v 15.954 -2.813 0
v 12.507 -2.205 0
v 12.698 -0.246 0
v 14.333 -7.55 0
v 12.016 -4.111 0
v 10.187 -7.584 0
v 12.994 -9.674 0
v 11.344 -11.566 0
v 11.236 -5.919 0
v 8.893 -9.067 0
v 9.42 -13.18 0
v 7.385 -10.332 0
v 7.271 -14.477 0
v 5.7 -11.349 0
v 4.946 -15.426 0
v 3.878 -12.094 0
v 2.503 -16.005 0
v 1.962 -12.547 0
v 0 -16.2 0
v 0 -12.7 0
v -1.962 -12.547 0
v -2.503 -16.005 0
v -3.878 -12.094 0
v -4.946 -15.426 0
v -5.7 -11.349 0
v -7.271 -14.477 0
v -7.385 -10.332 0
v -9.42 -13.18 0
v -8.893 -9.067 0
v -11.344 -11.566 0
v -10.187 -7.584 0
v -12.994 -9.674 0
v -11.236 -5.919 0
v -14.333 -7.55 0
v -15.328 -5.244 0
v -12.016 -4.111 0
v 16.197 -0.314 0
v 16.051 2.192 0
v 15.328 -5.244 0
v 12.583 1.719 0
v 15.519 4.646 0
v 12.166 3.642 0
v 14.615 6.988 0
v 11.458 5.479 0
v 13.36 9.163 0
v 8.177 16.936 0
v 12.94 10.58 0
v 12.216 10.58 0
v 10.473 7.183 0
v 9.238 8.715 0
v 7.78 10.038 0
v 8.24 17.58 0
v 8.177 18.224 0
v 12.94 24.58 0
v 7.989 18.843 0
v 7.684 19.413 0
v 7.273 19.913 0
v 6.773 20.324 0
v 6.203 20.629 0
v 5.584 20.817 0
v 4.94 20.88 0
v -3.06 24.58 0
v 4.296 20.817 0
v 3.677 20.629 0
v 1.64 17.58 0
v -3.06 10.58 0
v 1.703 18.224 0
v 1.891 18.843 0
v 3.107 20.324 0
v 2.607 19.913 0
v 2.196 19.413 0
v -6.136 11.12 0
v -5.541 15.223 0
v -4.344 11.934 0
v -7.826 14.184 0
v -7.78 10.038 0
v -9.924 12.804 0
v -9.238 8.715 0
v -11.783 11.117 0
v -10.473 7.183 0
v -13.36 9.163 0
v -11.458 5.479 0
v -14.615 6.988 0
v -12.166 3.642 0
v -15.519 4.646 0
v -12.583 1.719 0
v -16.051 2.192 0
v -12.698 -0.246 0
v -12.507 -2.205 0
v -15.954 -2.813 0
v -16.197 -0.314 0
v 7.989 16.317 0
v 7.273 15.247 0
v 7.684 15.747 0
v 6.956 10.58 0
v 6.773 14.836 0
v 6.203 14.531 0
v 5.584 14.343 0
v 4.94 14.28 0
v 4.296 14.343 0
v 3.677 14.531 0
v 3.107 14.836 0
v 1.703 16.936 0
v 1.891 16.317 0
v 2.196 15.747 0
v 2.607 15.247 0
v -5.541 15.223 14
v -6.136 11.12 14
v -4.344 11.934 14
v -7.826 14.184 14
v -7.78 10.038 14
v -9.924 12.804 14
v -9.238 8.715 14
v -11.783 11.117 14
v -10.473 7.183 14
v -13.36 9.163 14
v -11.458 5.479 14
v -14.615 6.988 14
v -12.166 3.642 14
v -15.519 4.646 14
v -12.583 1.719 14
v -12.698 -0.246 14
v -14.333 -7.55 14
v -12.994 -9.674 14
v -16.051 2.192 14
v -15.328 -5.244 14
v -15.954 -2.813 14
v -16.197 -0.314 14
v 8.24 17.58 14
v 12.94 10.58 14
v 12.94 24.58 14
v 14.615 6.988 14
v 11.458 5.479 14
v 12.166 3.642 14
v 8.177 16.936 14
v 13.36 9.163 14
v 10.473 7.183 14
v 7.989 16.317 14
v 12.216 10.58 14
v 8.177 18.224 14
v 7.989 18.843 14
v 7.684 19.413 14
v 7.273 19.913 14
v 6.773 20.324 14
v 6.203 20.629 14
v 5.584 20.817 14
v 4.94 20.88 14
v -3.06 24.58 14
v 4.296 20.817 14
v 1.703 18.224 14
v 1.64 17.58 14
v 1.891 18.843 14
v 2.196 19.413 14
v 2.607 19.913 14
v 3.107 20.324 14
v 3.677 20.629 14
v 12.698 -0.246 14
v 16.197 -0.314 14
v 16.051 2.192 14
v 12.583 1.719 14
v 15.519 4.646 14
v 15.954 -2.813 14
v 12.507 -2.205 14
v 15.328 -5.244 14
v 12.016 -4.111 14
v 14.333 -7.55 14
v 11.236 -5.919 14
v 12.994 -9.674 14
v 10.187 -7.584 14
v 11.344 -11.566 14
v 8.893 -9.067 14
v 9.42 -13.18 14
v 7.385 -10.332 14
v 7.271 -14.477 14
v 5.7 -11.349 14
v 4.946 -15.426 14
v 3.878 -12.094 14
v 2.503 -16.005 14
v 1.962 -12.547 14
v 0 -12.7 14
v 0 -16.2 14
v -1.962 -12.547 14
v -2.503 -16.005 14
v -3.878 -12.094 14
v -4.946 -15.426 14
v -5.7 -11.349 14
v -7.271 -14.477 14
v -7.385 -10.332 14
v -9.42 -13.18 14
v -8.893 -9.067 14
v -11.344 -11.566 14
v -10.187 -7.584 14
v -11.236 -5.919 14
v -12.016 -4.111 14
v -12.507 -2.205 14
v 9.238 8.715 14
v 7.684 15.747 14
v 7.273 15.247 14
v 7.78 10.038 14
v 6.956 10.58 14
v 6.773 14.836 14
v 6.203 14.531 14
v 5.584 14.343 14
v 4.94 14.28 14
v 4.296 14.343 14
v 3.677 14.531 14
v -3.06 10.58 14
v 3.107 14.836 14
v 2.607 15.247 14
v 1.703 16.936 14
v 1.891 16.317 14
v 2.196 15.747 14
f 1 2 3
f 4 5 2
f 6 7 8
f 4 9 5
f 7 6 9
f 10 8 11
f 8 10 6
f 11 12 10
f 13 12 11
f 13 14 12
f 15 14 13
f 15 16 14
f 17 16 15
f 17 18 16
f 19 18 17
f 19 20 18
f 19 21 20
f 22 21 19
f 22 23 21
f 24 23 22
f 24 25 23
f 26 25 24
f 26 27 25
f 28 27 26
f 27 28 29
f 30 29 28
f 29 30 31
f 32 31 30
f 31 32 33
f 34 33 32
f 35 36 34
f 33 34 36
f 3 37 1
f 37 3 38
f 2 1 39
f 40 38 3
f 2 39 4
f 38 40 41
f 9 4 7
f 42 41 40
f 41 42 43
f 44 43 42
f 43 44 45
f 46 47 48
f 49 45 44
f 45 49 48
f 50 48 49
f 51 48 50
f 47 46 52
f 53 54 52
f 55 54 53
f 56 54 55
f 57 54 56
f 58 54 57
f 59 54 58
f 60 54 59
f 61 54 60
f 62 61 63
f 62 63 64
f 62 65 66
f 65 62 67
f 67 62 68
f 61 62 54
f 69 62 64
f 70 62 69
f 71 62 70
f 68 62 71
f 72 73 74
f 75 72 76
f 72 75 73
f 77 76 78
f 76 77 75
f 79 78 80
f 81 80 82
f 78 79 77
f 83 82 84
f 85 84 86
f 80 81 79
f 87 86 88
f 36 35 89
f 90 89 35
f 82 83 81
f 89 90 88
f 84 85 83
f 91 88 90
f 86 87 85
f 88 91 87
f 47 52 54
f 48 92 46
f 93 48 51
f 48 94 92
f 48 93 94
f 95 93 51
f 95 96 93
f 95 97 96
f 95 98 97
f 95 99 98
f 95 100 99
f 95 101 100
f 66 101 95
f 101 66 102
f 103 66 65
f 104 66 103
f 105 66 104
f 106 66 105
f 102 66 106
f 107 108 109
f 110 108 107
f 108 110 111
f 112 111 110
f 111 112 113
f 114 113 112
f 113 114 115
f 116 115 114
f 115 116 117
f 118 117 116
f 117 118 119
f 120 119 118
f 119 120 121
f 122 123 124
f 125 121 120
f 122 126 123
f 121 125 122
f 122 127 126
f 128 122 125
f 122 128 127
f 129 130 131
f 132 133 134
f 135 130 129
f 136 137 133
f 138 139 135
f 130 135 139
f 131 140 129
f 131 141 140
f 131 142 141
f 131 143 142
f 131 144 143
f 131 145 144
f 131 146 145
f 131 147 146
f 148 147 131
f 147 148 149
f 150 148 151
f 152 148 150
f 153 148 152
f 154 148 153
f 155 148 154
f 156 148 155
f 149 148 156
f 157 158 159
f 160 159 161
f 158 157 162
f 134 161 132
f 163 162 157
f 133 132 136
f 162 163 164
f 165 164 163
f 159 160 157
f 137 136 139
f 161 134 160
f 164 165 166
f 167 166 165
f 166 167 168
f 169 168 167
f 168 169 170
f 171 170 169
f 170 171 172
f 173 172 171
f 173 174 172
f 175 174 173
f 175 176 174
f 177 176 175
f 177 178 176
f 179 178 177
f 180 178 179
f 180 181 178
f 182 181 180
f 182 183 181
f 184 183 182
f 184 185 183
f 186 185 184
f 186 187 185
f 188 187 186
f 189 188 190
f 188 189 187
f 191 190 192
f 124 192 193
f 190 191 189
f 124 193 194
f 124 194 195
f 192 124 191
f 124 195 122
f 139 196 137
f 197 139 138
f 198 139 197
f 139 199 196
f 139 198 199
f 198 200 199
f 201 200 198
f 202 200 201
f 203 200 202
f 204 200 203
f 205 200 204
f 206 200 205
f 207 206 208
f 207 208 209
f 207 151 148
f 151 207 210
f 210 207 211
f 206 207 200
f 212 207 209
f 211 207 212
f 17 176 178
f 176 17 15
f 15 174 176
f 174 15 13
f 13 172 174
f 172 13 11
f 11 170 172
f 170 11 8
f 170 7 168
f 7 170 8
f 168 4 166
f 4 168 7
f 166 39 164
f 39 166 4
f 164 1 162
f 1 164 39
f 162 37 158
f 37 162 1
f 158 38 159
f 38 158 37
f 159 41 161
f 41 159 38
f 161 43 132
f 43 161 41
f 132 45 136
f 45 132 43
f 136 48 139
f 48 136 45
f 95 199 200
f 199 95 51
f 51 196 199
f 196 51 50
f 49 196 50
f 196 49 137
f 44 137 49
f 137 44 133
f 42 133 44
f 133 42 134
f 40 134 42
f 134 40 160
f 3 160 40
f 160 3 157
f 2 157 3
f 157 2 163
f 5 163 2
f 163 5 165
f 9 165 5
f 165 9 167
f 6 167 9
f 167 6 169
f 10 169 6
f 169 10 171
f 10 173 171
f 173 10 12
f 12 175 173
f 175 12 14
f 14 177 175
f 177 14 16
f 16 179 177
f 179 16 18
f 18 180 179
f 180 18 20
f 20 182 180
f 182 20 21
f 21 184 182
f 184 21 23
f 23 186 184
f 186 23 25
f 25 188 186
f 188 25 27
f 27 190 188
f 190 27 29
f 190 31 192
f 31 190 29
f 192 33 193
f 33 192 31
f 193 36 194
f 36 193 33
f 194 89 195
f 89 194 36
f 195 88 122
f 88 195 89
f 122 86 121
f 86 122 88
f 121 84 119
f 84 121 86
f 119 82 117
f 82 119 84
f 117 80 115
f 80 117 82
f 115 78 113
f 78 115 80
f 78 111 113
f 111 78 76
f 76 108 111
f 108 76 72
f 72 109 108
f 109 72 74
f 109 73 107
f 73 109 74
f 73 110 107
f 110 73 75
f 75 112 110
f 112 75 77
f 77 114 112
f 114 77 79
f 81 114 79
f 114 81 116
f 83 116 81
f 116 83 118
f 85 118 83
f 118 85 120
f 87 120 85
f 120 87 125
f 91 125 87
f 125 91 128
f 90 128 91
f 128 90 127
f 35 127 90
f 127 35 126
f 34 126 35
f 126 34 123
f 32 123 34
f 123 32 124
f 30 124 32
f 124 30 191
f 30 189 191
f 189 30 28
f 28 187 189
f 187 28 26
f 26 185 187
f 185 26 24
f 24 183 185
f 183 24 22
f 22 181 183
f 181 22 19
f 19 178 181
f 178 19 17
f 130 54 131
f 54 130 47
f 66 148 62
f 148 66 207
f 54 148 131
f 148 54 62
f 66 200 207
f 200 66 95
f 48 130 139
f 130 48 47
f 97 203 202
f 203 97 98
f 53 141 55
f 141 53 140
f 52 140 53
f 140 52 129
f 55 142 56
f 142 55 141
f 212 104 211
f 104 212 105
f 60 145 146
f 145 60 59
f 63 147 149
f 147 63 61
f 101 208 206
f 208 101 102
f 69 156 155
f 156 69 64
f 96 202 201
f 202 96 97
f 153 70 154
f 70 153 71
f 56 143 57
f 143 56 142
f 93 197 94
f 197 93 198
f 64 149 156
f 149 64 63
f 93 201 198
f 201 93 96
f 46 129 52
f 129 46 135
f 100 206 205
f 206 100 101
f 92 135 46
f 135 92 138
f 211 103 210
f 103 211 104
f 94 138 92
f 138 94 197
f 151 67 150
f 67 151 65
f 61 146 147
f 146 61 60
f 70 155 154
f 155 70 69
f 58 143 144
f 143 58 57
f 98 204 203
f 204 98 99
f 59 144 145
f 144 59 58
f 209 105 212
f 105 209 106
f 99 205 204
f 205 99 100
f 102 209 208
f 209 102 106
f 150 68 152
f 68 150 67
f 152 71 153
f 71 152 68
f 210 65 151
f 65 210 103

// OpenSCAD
$fn = 32;

// ----------------------------------------------------------------------
// Pipe clamp: 32.4 mm ring, 3.5 mm wall, 14 mm wide
// ----------------------------------------------------------------------

// --- parameters (mm) ---
outer_r = 16.2;           // clamp outside radius
inner_r = 12.7;           // pipe bore radius
band = 3.5;               // band thickness
clamp_w = 14;             // clamp width
opening = 40;             // opening angle between the ends
lug_w = 16;               // lug width
lug_len = 14;             // lug length
bolt_d = 6.6;             // bolt hole

clamp_profile = [[-5.541, 15.223], [-7.826, 14.184], [-9.924, 12.804], [-11.783, 11.117], [-13.36, 9.163], [-14.615, 6.988], [-15.519, 4.646], [-16.051, 2.192], [-16.197, -0.314], [-15.954, -2.813], [-15.328, -5.244], [-14.333, -7.55], [-12.994, -9.674], [-11.344, -11.566], [-9.42, -13.18], [-7.271, -14.477], [-4.946, -15.426], [-2.503, -16.005], [0, -16.2], [2.503, -16.005], [4.946, -15.426], [7.271, -14.477], [9.42, -13.18], [11.344, -11.566], [12.994, -9.674], [14.333, -7.55], [15.328, -5.244], [15.954, -2.813], [16.197, -0.314], [16.051, 2.192], [15.519, 4.646], [14.615, 6.988], [13.36, 9.163], [11.783, 11.117], [9.924, 12.804], [7.826, 14.184], [5.541, 15.223], [4.344, 11.934], [6.136, 11.12], [7.78, 10.038], [9.238, 8.715], [10.473, 7.183], [11.458, 5.479], [12.166, 3.642], [12.583, 1.719], [12.698, -0.246], [12.507, -2.205], [12.016, -4.111], [11.236, -5.919], [10.187, -7.584], [8.893, -9.067], [7.385, -10.332], [5.7, -11.349], [3.878, -12.094], [1.962, -12.547], [0, -12.7], [-1.962, -12.547], [-3.878, -12.094], [-5.7, -11.349], [-7.385, -10.332], [-8.893, -9.067], [-10.187, -7.584], [-11.236, -5.919], [-12.016, -4.111], [-12.507, -2.205], [-12.698, -0.246], [-12.583, 1.719], [-12.166, 3.642], [-11.458, 5.479], [-10.473, 7.183], [-9.238, 8.715], [-7.78, 10.038], [-6.136, 11.12], [-4.344, 11.934]];

difference() {
  union() {
    linear_extrude(height = clamp_w) polygon(clamp_profile);
    /* bolt lug on the other end */
    translate([-3.06, 10.58, 0]) cube([lug_w, 14, clamp_w]);
  }
  translate([4.94, 17.58, -2.5]) cylinder(h = clamp_w + 5, d = bolt_d);
}
